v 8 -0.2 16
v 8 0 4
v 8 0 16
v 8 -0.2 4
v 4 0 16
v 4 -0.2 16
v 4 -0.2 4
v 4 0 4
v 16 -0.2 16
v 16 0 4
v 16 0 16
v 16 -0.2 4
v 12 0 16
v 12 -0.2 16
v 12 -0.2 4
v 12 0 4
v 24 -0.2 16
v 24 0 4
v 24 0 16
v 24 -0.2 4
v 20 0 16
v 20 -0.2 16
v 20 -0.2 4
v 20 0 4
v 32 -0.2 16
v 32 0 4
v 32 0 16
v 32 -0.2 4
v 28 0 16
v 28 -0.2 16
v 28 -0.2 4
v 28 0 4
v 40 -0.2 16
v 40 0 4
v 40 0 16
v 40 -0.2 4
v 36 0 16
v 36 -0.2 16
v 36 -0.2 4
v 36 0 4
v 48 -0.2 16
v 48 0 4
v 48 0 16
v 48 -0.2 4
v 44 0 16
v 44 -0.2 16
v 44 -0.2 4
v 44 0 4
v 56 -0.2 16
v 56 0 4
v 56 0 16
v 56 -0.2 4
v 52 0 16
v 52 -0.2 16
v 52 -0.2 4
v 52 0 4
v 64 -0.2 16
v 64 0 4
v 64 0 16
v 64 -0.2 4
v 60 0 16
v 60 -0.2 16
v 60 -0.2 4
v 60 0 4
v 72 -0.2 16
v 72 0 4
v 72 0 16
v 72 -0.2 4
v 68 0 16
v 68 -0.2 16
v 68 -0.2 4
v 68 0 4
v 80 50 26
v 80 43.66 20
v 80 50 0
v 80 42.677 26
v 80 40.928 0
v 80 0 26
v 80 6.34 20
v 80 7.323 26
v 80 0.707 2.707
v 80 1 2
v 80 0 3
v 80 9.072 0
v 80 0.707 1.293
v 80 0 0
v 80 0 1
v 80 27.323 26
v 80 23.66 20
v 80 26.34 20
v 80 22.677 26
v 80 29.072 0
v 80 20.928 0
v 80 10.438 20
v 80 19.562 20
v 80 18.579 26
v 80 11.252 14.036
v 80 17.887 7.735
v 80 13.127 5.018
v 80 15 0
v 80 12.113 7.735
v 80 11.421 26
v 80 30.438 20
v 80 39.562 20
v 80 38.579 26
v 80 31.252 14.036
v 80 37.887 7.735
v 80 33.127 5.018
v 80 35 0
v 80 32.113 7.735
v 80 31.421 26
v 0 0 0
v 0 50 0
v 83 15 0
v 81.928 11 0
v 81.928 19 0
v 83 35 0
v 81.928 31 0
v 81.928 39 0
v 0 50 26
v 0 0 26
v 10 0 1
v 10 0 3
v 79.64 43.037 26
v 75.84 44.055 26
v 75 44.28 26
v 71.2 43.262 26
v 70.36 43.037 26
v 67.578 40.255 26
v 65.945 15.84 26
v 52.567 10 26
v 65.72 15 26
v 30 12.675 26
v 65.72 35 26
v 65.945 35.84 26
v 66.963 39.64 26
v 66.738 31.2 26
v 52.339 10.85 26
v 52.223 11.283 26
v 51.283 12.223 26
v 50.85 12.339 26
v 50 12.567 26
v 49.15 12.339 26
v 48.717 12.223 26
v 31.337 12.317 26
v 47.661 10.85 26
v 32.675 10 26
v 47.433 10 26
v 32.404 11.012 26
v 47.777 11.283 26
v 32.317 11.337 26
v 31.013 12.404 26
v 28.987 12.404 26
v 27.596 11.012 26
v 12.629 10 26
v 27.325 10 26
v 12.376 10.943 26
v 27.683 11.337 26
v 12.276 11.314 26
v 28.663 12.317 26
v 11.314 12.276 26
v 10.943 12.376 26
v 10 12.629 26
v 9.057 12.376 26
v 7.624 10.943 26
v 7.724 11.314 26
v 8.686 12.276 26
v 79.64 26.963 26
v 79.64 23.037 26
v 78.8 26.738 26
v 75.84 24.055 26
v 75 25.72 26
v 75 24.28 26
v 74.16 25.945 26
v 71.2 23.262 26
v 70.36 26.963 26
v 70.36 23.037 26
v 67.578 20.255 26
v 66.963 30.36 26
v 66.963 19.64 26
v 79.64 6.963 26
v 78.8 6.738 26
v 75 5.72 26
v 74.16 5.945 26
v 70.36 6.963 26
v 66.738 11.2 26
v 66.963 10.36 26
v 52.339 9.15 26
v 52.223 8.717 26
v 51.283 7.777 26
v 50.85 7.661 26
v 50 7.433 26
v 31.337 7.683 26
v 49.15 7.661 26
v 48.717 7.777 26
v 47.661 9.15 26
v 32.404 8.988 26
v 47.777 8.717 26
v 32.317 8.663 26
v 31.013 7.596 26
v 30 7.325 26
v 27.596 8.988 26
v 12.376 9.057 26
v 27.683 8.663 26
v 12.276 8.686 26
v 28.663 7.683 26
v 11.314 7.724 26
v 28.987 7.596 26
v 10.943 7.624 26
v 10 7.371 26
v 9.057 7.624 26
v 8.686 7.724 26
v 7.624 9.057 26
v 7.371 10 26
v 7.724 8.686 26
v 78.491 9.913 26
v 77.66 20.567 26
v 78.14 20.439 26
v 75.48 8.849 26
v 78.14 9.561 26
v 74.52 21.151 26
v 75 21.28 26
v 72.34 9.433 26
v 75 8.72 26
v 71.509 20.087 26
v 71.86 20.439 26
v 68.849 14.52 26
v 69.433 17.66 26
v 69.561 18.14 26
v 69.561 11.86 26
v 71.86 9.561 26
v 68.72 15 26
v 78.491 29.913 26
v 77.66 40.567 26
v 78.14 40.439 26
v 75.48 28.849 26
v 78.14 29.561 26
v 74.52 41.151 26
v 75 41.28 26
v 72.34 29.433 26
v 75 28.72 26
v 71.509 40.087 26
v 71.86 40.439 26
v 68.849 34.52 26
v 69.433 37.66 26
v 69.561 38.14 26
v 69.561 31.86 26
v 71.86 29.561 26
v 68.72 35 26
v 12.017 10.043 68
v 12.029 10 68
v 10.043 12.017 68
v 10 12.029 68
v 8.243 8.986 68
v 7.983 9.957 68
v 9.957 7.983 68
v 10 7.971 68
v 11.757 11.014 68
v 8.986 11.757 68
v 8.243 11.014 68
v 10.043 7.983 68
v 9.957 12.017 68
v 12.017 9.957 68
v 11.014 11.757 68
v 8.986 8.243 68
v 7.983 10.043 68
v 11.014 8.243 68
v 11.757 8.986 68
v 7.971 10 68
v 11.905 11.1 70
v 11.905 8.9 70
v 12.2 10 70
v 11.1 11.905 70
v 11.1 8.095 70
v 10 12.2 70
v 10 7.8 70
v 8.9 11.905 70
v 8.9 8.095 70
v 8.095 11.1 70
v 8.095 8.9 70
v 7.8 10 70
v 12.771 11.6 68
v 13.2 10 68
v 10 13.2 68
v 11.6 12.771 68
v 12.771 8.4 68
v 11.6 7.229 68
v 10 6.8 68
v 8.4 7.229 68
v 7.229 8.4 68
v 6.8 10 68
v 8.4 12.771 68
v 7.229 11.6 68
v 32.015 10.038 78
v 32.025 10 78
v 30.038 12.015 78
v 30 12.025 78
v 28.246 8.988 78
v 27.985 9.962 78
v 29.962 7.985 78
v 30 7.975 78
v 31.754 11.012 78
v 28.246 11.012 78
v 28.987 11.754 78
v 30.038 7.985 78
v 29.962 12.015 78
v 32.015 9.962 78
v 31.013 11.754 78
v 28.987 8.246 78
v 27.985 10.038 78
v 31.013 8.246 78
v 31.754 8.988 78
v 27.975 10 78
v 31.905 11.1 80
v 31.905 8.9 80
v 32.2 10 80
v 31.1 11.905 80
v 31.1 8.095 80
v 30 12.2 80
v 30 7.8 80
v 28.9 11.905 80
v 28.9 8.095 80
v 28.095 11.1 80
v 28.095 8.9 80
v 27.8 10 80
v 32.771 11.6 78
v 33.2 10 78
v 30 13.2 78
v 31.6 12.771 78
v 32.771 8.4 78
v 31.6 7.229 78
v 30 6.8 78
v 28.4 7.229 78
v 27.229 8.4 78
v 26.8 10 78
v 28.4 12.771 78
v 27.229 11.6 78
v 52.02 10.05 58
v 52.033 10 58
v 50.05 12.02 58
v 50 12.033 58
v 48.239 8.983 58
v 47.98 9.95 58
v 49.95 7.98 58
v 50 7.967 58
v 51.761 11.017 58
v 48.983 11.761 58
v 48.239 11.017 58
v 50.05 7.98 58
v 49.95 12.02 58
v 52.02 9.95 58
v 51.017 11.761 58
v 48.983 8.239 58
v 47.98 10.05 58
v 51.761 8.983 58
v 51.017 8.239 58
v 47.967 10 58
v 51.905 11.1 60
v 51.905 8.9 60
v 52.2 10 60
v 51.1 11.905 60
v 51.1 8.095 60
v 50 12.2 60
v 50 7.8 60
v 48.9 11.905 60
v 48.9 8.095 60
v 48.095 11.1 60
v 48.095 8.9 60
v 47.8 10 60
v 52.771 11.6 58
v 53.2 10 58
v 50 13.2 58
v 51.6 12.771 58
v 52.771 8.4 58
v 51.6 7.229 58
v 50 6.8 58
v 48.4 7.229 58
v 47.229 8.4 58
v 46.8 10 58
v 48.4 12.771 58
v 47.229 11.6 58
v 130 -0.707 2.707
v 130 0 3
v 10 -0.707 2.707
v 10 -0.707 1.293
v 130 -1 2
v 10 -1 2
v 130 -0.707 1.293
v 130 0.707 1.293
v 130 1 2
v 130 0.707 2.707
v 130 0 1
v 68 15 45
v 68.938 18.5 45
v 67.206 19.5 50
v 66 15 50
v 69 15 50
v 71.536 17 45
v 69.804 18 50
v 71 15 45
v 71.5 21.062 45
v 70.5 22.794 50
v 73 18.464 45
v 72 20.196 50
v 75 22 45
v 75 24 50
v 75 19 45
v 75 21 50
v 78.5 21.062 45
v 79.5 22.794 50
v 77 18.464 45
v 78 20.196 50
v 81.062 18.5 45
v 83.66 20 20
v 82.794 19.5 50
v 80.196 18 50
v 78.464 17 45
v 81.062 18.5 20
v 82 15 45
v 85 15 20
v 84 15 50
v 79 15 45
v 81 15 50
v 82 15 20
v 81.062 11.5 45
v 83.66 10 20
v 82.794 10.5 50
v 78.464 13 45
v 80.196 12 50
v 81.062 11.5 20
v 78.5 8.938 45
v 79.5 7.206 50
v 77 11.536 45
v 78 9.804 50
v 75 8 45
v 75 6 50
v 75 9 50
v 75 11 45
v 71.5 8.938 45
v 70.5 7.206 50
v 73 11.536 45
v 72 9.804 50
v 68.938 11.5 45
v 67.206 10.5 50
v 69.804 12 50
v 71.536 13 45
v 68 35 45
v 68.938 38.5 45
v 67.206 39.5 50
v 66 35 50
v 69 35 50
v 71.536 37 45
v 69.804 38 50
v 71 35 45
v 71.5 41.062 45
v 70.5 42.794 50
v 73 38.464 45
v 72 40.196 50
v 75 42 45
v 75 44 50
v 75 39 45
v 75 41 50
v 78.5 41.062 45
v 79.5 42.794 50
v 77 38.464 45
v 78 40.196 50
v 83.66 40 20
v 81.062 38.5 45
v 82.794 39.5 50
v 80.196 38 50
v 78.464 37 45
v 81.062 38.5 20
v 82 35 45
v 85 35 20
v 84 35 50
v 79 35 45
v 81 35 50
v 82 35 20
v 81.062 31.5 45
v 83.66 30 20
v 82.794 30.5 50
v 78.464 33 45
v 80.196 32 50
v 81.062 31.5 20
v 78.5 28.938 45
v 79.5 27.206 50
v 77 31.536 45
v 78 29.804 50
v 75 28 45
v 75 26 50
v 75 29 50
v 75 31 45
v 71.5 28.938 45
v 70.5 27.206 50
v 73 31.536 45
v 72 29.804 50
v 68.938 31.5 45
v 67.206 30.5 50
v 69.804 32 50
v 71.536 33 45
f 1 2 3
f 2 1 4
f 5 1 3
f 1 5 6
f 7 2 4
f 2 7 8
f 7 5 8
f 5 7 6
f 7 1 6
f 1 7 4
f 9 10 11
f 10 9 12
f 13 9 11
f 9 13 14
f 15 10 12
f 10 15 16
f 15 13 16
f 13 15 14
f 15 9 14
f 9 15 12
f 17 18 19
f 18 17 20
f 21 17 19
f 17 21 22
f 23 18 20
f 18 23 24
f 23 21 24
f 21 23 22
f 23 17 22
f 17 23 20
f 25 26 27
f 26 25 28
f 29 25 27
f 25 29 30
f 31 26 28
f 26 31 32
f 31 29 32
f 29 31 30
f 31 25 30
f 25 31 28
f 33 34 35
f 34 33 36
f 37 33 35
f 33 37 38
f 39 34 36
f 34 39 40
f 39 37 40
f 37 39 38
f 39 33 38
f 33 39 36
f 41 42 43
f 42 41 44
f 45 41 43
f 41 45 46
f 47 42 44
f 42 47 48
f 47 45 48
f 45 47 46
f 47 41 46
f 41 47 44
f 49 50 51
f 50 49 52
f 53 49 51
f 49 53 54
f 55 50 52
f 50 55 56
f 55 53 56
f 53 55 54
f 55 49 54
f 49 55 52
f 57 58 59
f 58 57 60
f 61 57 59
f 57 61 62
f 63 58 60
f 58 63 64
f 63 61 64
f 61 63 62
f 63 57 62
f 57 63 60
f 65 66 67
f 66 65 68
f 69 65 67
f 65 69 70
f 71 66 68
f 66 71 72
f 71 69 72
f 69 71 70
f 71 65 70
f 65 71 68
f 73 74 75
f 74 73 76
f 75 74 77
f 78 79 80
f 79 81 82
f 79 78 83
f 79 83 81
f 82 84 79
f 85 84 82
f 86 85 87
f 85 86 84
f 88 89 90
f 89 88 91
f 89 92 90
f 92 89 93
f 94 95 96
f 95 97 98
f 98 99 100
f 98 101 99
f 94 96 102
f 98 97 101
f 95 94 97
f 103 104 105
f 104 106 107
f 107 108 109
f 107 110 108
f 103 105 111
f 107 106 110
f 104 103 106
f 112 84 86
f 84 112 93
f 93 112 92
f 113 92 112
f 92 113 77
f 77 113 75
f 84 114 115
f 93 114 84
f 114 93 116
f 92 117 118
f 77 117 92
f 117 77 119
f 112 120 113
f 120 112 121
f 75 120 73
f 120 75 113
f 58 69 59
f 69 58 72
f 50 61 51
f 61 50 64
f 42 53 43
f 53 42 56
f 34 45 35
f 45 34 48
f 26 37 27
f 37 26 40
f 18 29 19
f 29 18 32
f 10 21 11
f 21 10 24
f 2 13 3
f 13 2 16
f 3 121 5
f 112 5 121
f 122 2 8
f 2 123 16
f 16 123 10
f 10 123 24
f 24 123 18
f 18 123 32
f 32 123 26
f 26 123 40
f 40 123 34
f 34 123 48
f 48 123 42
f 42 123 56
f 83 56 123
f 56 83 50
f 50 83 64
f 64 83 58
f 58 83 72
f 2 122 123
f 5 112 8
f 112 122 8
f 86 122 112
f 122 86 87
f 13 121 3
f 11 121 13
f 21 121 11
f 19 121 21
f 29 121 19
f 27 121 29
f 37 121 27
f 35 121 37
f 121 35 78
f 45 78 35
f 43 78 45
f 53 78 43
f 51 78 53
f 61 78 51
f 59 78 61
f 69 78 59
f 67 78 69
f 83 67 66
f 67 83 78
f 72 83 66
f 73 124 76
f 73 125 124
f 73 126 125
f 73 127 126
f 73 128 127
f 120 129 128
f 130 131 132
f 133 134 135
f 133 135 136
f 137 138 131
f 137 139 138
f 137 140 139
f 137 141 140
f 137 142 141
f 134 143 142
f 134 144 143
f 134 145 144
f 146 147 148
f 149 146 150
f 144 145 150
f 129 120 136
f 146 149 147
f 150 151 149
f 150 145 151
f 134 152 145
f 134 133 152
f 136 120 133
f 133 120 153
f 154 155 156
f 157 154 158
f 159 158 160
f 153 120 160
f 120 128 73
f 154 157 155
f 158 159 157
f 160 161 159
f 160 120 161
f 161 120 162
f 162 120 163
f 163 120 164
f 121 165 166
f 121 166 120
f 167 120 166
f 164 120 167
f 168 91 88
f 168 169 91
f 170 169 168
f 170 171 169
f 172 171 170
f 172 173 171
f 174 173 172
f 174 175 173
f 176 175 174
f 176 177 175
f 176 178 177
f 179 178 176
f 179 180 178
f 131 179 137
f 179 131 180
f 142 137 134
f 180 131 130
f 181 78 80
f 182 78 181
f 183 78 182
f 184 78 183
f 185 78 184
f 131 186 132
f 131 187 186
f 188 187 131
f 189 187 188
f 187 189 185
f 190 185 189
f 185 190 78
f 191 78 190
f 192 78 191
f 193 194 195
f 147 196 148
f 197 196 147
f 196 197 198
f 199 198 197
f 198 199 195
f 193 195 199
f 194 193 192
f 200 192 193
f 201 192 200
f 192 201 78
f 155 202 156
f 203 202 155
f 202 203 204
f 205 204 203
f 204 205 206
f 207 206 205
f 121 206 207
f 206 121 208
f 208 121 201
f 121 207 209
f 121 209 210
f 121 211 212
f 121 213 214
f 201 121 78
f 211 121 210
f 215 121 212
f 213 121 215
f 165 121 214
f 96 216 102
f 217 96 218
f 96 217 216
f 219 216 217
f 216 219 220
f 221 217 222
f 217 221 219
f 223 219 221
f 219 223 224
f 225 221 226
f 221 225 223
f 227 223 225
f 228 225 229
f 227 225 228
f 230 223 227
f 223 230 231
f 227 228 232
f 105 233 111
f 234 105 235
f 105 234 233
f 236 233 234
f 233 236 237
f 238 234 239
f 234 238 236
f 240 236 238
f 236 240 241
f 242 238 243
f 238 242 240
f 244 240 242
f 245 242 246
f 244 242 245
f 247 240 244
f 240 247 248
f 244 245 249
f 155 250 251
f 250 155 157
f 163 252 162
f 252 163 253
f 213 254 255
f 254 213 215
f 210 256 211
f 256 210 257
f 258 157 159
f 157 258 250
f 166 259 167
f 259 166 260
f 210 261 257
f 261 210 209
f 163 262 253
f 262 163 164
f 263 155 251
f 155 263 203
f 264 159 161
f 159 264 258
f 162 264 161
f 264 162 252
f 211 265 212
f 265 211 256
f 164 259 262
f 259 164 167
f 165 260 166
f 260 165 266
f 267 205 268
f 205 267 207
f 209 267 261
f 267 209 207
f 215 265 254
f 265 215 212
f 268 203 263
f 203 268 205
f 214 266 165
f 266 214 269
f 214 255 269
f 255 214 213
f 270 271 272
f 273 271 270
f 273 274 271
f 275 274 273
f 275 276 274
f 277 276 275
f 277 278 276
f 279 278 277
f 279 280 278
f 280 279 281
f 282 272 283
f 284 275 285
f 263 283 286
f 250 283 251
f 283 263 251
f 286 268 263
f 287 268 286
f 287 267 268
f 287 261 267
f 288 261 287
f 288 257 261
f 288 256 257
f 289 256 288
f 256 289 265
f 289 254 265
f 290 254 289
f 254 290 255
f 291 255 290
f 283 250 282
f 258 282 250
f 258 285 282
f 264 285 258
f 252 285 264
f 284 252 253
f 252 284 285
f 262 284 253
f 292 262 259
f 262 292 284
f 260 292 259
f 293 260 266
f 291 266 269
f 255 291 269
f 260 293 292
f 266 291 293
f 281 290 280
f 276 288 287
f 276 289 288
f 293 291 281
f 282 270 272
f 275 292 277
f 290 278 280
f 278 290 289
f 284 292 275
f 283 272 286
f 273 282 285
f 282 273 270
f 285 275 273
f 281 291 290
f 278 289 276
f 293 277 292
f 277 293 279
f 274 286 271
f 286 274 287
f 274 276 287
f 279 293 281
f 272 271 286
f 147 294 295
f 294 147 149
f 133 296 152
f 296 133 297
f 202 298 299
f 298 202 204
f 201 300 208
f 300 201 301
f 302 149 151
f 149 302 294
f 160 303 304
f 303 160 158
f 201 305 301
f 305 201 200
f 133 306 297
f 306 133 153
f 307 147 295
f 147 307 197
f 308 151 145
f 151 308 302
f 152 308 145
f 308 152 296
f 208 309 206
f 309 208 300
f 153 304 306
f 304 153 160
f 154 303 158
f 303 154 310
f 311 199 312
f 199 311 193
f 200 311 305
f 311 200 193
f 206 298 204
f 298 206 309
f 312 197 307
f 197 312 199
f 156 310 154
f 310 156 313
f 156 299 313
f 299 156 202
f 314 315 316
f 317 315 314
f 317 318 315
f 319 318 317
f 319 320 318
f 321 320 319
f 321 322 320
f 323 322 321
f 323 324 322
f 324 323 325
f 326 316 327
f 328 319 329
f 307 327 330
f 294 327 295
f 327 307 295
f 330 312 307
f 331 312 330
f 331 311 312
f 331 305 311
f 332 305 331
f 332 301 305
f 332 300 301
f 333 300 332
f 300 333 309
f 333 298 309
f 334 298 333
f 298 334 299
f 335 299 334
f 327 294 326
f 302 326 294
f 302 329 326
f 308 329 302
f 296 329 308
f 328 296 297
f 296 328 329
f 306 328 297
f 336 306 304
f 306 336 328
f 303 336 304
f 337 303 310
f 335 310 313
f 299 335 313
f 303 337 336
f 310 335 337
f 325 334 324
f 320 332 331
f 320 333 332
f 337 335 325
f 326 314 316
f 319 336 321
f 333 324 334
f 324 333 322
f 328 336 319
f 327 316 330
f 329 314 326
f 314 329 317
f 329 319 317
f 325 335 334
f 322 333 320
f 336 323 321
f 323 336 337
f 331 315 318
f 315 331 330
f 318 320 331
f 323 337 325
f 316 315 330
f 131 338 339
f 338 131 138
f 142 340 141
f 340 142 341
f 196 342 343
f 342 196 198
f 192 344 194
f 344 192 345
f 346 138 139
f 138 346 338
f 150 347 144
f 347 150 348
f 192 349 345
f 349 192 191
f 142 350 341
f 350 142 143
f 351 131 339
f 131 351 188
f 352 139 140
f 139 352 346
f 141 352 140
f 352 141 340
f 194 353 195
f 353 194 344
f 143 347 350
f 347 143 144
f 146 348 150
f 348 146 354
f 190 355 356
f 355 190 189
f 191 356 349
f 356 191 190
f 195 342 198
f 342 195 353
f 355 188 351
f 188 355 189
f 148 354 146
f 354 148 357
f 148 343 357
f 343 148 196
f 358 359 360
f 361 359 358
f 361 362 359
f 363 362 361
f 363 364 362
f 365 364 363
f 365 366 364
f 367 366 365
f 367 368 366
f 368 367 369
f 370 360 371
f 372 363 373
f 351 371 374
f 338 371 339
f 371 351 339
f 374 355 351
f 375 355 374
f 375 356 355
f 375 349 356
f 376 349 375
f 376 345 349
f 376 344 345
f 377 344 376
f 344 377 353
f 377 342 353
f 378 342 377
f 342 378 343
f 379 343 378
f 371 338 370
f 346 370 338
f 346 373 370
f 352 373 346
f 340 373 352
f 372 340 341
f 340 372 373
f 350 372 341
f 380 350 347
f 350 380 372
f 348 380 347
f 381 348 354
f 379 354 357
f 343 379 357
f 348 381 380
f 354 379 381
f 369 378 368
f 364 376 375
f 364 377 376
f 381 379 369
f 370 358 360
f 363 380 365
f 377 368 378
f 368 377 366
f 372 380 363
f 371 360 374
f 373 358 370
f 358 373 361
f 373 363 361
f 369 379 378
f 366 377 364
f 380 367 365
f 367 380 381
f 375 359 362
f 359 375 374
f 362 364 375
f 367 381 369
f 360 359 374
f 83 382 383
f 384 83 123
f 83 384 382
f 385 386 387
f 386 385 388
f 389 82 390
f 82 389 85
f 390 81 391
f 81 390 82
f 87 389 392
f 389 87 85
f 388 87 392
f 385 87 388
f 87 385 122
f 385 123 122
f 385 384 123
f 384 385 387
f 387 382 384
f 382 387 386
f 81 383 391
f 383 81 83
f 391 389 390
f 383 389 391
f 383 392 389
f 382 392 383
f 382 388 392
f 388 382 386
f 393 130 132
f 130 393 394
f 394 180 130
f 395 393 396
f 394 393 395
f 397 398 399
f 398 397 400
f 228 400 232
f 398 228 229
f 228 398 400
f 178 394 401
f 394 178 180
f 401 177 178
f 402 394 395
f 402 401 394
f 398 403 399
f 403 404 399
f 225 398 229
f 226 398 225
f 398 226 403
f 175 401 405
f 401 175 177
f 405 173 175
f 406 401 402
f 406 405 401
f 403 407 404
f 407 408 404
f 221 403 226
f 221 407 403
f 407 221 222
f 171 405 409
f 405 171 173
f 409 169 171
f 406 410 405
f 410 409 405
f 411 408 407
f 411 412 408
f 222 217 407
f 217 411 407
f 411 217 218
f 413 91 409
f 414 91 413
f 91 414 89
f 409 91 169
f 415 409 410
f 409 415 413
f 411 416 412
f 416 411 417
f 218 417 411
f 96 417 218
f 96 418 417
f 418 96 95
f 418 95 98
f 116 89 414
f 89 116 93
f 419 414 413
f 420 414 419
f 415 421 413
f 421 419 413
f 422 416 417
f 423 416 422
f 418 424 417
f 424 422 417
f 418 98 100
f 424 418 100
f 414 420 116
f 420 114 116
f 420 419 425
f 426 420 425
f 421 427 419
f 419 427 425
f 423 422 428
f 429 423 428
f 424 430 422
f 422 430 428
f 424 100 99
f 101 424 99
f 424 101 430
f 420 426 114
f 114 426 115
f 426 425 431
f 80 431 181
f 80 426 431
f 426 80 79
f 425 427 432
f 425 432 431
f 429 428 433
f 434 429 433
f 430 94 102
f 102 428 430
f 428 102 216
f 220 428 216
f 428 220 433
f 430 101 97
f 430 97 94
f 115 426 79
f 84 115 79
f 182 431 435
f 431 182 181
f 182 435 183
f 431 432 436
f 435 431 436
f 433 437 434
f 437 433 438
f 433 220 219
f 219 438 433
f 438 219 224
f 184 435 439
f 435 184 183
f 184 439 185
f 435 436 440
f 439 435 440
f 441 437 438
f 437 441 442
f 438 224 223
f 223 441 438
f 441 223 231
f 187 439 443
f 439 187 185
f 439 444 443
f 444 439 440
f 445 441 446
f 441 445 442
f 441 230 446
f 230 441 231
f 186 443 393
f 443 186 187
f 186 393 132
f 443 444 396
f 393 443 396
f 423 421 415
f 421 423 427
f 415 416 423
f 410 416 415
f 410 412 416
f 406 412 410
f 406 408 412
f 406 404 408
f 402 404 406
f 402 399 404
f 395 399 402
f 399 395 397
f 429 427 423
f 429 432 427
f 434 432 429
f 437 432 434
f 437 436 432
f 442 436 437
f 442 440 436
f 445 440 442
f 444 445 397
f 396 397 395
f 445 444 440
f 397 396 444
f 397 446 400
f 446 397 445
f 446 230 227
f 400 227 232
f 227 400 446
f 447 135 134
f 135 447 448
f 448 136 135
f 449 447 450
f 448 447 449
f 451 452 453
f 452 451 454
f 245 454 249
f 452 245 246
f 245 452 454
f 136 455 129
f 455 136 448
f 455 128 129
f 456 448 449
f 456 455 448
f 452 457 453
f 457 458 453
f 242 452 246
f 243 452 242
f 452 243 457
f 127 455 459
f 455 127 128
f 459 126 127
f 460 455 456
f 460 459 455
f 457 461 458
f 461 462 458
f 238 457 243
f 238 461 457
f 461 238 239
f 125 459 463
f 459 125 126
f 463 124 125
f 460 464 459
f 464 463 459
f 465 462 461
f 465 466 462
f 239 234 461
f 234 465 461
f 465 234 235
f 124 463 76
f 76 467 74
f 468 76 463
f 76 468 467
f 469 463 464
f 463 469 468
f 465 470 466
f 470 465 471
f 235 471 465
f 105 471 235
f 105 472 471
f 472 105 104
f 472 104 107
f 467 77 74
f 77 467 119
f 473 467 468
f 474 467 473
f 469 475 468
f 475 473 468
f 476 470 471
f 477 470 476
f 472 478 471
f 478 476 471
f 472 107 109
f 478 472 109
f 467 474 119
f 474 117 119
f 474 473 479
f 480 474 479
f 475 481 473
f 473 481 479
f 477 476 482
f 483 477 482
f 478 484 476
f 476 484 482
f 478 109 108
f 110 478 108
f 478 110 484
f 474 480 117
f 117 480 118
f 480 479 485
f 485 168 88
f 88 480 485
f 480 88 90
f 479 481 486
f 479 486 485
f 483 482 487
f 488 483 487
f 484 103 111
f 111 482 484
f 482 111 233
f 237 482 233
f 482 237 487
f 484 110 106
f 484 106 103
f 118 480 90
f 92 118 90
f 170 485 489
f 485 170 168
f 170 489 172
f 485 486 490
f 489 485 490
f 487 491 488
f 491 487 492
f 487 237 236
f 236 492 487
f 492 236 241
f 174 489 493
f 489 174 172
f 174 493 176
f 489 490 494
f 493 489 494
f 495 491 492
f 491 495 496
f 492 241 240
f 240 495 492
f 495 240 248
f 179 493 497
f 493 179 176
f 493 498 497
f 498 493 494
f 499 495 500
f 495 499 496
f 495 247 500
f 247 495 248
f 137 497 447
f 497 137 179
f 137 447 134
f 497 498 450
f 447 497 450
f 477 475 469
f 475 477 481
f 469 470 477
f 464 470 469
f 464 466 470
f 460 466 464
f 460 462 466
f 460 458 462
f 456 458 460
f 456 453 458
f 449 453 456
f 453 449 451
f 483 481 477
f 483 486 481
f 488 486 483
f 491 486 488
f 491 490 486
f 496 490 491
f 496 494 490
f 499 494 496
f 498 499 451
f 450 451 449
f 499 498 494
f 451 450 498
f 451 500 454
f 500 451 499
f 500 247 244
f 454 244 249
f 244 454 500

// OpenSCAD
// 大型工业区 (主厂房 + 3 烟囱 + 2 冷却塔 + 管道网络)
// 不追求低模
$fn = 12;

module hall() {
  color("#8f8a80") cube([80, 50, 24]);
  color("#6f6a60") translate([0, 0, 24]) cube([80, 50, 2]);
  // 侧高窗
  for (ix = [4 : 8 : 72])
    color("#33414d") translate([ix, 25.2, 4]) cube([4, 0.4, 12]);
  for (ix = [4 : 8 : 72])
    color("#33414d") translate([ix, -0.2, 4]) cube([4, 0.4, 12]);
}

module chimney(px, py, h) {
  color("#b0a89a") cylinder(r1 = 3, r2 = 2, h = h, $fn = 12);
  color("#888") translate([0, 0, h - 2]) cylinder(r1 = 3.2, r2 = 2.2, h = 2, $fn = 12);
}

module cooling_tower(px, py) {
  color("#9a9a90") translate([px, py, 0]) rotate_extrude()
    polygon([[8, 0], [10, 20], [7, 45], [9, 50], [6, 50], [4, 45], [7, 20], [5, 0]]);
}

module pipes() {
  color("#777") for (i = [0 : 1 : 5])
    translate([10 + i * 12, 0, 2]) rotate([0, 90, 0]) cylinder(r = 1, h = 60, $fn = 8);
  color("#aa5533") translate([0, 40, 3]) rotate([0, 90, 0]) cylinder(r = 1.4, h = 70, $fn = 8);
}

hall();
translate([10, 10, 0]) chimney(10, 10, 70);
translate([30, 10, 0]) chimney(30, 10, 80);
translate([50, 10, 0]) chimney(50, 10, 60);
cooling_tower(75, 15);
cooling_tower(75, 35);
pipes();
